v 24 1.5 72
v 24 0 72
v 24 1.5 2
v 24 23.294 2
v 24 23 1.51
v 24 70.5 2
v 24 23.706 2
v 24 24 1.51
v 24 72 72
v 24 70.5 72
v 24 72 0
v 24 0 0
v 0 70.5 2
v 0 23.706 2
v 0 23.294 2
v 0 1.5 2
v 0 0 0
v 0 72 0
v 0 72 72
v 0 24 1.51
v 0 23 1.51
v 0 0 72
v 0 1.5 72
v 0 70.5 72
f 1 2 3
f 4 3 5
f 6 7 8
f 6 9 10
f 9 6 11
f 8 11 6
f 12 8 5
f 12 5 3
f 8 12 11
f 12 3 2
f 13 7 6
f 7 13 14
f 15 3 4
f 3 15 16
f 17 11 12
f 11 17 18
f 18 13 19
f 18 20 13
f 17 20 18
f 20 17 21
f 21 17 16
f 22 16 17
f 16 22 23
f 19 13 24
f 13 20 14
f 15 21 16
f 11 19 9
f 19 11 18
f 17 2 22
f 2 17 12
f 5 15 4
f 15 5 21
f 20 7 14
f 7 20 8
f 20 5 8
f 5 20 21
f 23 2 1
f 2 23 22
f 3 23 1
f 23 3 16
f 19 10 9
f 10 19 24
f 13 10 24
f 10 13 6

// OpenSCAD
module basePlate() {
    color([.42,.09,.09])
    difference(){
        
        cube([24,72,2]);
        translate([2,.25,-.1]) cube([6,1,2.2]);
        translate([16,.25,-.1]) cube([6,1,2.2]);
        translate([2,70.75,-.1]) cube([6,1,2.2]);
        translate([16,70.75,-.1]) cube([6,1,2.2]);
        translate([0,23,1.51]) polyhedron(points=[[-1,0,0],[-1,1,0],[25,1,0],[25,0,0],[25,.3,.5],[25,.7,.5],[-1,.7,.5],[-1,.3,.5]], faces=[[3,2,1,0],[7,6,5,4],[0,1,6,7],[2,3,4,5],[7,4,3,0],[1,2,5,6]]);
    }
}
module side() {
    color([.5,.09,.09])
    difference(){
        union(){
            translate([0,0,2]) cube([24,1.5,70]);
            translate([2,.25,0]) cube([6,1,2.2]);
            translate([16,.25,0]) cube([6,1,2.2]);
        }
    }
}

basePlate();
side();
translate([0,70.5,0]) side();
